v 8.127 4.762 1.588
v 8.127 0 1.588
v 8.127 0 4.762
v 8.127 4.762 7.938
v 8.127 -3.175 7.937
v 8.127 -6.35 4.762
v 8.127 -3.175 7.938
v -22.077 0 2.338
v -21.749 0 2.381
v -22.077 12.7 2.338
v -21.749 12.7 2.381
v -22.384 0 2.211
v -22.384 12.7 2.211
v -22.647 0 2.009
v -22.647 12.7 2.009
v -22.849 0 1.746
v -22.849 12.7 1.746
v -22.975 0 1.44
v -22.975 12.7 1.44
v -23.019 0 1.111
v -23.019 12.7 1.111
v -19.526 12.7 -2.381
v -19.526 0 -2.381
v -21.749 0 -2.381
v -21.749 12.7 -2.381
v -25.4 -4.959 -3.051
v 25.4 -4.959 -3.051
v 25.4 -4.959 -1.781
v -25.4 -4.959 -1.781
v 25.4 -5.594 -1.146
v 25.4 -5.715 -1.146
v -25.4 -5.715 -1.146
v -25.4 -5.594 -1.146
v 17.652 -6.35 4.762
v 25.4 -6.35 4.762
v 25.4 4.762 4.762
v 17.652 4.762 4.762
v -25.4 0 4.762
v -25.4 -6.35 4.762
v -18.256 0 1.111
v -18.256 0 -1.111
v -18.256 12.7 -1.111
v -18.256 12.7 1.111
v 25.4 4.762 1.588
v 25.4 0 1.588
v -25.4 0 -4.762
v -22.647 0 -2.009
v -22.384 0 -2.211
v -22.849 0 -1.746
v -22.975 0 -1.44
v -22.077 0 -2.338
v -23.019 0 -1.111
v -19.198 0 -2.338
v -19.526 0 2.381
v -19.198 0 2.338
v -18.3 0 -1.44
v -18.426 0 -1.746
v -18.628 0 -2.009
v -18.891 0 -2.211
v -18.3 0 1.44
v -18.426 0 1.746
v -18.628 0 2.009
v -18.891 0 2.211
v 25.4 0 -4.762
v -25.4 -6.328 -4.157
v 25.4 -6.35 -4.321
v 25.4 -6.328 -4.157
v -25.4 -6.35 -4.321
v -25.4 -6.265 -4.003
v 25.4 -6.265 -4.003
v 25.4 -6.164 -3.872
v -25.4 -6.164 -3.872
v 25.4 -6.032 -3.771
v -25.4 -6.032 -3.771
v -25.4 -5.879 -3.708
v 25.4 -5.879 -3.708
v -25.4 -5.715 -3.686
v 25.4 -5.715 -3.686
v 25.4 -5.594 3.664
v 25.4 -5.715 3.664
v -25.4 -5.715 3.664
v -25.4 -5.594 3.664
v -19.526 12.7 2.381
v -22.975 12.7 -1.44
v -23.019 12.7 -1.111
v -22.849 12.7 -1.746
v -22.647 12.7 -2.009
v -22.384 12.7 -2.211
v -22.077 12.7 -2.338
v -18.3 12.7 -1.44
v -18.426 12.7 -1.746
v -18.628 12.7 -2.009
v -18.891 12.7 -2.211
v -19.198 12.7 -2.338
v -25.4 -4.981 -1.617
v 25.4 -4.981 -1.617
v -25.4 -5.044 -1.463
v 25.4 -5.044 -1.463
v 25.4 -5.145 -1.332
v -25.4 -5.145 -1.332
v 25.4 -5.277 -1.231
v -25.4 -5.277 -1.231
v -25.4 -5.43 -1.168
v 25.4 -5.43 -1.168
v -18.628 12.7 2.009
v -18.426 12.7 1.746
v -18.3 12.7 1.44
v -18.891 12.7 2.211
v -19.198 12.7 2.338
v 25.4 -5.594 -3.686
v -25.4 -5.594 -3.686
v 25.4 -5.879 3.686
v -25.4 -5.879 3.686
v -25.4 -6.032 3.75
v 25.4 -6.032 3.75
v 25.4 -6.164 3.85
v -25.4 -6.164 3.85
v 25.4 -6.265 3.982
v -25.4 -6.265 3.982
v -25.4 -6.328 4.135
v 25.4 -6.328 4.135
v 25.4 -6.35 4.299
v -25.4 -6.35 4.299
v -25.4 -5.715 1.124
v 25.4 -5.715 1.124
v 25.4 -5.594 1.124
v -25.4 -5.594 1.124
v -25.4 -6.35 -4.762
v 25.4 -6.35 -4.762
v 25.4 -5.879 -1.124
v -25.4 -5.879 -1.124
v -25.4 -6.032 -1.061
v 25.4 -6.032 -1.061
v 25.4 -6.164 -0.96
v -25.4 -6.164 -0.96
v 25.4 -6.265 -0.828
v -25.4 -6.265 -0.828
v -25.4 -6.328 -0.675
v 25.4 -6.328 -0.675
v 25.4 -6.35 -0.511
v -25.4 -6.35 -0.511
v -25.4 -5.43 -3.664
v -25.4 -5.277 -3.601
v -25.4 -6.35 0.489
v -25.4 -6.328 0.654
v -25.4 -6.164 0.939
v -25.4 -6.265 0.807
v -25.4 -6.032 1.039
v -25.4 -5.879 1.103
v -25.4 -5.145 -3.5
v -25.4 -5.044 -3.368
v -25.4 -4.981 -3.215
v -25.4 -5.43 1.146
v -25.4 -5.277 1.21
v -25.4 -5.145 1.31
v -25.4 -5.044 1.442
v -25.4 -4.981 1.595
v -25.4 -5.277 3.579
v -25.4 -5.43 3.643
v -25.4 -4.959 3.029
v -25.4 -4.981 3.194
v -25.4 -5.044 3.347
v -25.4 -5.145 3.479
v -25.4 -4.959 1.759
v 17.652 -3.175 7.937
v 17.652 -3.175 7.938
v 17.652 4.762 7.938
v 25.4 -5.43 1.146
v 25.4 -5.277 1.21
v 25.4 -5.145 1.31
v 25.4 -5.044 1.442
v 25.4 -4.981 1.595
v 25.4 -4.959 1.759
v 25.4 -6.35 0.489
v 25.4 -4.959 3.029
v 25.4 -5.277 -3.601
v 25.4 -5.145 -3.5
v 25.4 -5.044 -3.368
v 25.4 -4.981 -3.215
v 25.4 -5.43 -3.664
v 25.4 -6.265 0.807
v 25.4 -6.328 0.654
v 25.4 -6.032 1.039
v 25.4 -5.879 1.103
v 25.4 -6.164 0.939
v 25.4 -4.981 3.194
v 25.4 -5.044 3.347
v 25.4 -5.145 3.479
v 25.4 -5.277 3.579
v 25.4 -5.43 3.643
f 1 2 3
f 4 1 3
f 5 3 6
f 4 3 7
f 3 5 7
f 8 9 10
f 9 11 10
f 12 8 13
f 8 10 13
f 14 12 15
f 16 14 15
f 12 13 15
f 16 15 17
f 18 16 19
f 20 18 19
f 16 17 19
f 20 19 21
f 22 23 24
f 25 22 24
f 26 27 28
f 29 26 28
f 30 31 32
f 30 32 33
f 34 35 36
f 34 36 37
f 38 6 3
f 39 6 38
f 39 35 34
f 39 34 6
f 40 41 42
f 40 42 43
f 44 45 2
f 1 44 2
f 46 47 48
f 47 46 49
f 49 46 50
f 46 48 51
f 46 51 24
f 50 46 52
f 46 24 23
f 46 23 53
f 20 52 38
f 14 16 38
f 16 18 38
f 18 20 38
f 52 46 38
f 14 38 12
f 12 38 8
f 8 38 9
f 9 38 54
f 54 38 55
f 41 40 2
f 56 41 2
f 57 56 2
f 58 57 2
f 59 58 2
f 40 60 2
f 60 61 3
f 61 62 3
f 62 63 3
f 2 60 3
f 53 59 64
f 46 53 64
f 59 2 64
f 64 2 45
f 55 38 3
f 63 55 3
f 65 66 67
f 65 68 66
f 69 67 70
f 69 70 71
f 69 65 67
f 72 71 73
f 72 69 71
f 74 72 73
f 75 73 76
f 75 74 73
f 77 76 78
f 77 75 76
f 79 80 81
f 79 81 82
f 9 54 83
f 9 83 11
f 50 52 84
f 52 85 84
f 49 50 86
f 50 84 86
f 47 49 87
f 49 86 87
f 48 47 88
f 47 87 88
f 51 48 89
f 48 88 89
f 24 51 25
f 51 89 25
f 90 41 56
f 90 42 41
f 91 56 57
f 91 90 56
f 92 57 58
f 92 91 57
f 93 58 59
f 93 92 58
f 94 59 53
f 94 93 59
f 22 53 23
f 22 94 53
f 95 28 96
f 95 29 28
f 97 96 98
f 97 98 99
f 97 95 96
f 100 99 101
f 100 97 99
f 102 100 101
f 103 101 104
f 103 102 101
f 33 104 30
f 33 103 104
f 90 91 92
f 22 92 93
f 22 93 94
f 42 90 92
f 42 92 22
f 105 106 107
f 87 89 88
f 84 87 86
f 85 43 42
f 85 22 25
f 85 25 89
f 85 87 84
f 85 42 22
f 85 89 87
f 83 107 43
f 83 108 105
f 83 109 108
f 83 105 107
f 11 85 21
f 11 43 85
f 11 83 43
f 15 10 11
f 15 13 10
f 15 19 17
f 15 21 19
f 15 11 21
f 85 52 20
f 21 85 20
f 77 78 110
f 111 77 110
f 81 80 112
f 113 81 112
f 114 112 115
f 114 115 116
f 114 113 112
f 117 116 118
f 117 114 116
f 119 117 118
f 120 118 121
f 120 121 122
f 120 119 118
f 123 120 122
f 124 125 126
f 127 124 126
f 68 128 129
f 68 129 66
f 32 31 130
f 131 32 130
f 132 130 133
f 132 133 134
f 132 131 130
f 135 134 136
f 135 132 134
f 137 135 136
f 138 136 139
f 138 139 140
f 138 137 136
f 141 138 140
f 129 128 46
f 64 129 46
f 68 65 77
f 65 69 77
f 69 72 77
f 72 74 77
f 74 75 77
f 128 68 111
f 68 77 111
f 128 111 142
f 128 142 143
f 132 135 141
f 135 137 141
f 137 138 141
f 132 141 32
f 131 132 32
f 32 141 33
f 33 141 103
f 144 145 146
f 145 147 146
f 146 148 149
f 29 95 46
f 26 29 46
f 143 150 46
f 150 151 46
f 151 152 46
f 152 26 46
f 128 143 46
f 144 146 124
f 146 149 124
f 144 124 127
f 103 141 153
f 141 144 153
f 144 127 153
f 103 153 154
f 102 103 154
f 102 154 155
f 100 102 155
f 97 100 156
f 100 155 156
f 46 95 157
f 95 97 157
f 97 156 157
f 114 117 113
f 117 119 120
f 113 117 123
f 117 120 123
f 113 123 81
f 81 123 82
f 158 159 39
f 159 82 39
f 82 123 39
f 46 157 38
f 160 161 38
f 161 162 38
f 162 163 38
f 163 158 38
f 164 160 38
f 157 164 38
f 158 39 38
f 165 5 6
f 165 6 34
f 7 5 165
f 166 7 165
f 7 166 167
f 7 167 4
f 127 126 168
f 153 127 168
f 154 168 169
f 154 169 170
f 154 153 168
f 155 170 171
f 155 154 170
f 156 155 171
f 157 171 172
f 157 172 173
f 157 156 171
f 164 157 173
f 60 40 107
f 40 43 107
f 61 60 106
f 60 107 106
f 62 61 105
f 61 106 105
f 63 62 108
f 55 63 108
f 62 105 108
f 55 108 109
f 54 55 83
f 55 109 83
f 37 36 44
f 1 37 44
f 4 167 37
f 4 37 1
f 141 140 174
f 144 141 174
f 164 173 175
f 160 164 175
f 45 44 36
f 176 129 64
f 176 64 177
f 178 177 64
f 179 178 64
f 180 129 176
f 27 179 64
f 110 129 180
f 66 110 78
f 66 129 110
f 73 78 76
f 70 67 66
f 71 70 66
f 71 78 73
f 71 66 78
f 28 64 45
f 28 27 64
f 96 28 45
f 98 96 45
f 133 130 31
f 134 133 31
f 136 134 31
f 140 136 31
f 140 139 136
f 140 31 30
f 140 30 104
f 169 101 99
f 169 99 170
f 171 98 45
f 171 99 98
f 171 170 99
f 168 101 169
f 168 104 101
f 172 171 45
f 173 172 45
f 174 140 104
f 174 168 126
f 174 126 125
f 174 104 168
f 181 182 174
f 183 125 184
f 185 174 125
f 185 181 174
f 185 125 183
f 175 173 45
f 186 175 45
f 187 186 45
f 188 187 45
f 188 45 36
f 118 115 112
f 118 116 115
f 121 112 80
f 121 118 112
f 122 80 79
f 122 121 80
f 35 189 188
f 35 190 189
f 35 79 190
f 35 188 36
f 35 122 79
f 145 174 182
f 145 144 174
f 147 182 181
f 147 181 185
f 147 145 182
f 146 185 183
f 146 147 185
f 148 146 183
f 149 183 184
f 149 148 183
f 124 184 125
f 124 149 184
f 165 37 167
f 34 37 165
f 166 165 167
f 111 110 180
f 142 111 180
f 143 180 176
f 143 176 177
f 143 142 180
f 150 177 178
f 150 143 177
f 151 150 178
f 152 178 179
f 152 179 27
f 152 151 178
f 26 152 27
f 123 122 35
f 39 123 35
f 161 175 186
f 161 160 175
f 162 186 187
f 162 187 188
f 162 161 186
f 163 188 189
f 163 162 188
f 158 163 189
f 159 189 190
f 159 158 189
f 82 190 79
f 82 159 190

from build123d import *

# Parameters (mm, degrees)
F0_W      = 50.8
F0_H      = 9.525
F1_DEPTH  = 3.175
F2_W      = 3.175
F2_H      = 9.525
F3_DEPTH  = 50.8
F4_W      = 4.7625
F4_H      = 4.7625
F5_DEPTH  = 12.7
F6_R      = 1.27
F7_W      = 9.525
F7_H      = 3.175
F8_DEPTH  = 3.175
F9_W      = 17.272898303
F9_H      = 3.175
F9_W_2    = 9.525
F10_DEPTH = 4.7625
F11_W     = 1.3907738797
F11_H     = 2.54
F12_DEPTH = 50.8
F13_R     = 0.635
F14_SIZE  = 3.17499


# Not quite as in the source:
# - a fillet or chamfer is up to 0.001 mm smaller than in the source, because OpenCascade refuses the exact size


with BuildPart() as f1:
    # F0 (on Front) → F1 (new body)
    with BuildSketch(Plane.XZ):
        Rectangle(F0_W, F0_H)
    extrude(amount=F1_DEPTH)

    # F2 (on face) → F3 (join)
    with BuildSketch(Plane.YZ.offset(25.4)):
        with Locations((-4.7625, 0)):
            Rectangle(F2_W, F2_H)
    extrude(amount=-F3_DEPTH)

    # F4 (on face) → F5 (join)
    with BuildSketch(Plane(origin=(0, 0, 0), x_dir=(-1, 0, 0), z_dir=(0, 1, 0))):
        with Locations((20.6375, 0)):
            Rectangle(F4_W, F4_H)
    extrude(amount=F5_DEPTH)

    # F6
    f6_edges = [f1.edges().sort_by_distance(p)[0] for p in [
        (-18.25625, 6.35, 2.38125),
        (-23.01875, 6.35, 2.38125),
        (-18.25625, 6.35, -2.38125),
        (-23.01875, 6.35, -2.38125),
    ]]
    fillet(f6_edges, radius=F6_R)

    # F7 (on face) → F8 (join)
    with BuildSketch(Plane.XY.offset(4.7625)):
        with Locations((12.889601697, -1.5875)):
            Rectangle(F7_W, F7_H)
    extrude(amount=F8_DEPTH)

    # F9 (on face) → F10 (join)
    with BuildSketch(Plane(origin=(0, 0, 0), x_dir=(-1, 0, 0), z_dir=(0, 1, 0))):
        with Locations((-16.7635508485, 3.175)):
            Rectangle(F9_W, F9_H)
        with Locations((-12.889601697, 6.35)):
            Rectangle(F9_W_2, F9_H)
    extrude(amount=F10_DEPTH)

    # F11 (on face) → F12 (cut)
    with BuildSketch(Plane.YZ.offset(25.4)):
        with Locations((-5.6546130601, 2.3944999478)):
            Rectangle(F11_W, F11_H)
        with Locations((-5.6546130601, -2.4159172396)):
            Rectangle(F11_W, F11_H)
    extrude(amount=-F12_DEPTH, mode=Mode.SUBTRACT)

    # F13
    f13_edges = [f1.edges().sort_by_distance(p)[0] for p in [
        (0, -4.959226, 1.1245),
        (0, -4.959226, 3.6645),
        (0, -4.959226, -3.685917),
        (0, -4.959226, -1.145917),
        (0, -6.35, 1.1245),
        (0, -6.35, -1.145917),
        (0, -6.35, 3.6645),
        (0, -6.35, -3.685917),
    ]]
    fillet(f13_edges, radius=F13_R)

    # F14 (size 3.175 in the source; OpenCascade refuses exactly that, so slightly less here)
    f14_edges = [f1.edges().sort_by_distance(p)[0] for p in [
        (12.889602, -3.175, 4.7625),
    ]]
    chamfer(f14_edges, length=F14_SIZE)


solid = f1.part
